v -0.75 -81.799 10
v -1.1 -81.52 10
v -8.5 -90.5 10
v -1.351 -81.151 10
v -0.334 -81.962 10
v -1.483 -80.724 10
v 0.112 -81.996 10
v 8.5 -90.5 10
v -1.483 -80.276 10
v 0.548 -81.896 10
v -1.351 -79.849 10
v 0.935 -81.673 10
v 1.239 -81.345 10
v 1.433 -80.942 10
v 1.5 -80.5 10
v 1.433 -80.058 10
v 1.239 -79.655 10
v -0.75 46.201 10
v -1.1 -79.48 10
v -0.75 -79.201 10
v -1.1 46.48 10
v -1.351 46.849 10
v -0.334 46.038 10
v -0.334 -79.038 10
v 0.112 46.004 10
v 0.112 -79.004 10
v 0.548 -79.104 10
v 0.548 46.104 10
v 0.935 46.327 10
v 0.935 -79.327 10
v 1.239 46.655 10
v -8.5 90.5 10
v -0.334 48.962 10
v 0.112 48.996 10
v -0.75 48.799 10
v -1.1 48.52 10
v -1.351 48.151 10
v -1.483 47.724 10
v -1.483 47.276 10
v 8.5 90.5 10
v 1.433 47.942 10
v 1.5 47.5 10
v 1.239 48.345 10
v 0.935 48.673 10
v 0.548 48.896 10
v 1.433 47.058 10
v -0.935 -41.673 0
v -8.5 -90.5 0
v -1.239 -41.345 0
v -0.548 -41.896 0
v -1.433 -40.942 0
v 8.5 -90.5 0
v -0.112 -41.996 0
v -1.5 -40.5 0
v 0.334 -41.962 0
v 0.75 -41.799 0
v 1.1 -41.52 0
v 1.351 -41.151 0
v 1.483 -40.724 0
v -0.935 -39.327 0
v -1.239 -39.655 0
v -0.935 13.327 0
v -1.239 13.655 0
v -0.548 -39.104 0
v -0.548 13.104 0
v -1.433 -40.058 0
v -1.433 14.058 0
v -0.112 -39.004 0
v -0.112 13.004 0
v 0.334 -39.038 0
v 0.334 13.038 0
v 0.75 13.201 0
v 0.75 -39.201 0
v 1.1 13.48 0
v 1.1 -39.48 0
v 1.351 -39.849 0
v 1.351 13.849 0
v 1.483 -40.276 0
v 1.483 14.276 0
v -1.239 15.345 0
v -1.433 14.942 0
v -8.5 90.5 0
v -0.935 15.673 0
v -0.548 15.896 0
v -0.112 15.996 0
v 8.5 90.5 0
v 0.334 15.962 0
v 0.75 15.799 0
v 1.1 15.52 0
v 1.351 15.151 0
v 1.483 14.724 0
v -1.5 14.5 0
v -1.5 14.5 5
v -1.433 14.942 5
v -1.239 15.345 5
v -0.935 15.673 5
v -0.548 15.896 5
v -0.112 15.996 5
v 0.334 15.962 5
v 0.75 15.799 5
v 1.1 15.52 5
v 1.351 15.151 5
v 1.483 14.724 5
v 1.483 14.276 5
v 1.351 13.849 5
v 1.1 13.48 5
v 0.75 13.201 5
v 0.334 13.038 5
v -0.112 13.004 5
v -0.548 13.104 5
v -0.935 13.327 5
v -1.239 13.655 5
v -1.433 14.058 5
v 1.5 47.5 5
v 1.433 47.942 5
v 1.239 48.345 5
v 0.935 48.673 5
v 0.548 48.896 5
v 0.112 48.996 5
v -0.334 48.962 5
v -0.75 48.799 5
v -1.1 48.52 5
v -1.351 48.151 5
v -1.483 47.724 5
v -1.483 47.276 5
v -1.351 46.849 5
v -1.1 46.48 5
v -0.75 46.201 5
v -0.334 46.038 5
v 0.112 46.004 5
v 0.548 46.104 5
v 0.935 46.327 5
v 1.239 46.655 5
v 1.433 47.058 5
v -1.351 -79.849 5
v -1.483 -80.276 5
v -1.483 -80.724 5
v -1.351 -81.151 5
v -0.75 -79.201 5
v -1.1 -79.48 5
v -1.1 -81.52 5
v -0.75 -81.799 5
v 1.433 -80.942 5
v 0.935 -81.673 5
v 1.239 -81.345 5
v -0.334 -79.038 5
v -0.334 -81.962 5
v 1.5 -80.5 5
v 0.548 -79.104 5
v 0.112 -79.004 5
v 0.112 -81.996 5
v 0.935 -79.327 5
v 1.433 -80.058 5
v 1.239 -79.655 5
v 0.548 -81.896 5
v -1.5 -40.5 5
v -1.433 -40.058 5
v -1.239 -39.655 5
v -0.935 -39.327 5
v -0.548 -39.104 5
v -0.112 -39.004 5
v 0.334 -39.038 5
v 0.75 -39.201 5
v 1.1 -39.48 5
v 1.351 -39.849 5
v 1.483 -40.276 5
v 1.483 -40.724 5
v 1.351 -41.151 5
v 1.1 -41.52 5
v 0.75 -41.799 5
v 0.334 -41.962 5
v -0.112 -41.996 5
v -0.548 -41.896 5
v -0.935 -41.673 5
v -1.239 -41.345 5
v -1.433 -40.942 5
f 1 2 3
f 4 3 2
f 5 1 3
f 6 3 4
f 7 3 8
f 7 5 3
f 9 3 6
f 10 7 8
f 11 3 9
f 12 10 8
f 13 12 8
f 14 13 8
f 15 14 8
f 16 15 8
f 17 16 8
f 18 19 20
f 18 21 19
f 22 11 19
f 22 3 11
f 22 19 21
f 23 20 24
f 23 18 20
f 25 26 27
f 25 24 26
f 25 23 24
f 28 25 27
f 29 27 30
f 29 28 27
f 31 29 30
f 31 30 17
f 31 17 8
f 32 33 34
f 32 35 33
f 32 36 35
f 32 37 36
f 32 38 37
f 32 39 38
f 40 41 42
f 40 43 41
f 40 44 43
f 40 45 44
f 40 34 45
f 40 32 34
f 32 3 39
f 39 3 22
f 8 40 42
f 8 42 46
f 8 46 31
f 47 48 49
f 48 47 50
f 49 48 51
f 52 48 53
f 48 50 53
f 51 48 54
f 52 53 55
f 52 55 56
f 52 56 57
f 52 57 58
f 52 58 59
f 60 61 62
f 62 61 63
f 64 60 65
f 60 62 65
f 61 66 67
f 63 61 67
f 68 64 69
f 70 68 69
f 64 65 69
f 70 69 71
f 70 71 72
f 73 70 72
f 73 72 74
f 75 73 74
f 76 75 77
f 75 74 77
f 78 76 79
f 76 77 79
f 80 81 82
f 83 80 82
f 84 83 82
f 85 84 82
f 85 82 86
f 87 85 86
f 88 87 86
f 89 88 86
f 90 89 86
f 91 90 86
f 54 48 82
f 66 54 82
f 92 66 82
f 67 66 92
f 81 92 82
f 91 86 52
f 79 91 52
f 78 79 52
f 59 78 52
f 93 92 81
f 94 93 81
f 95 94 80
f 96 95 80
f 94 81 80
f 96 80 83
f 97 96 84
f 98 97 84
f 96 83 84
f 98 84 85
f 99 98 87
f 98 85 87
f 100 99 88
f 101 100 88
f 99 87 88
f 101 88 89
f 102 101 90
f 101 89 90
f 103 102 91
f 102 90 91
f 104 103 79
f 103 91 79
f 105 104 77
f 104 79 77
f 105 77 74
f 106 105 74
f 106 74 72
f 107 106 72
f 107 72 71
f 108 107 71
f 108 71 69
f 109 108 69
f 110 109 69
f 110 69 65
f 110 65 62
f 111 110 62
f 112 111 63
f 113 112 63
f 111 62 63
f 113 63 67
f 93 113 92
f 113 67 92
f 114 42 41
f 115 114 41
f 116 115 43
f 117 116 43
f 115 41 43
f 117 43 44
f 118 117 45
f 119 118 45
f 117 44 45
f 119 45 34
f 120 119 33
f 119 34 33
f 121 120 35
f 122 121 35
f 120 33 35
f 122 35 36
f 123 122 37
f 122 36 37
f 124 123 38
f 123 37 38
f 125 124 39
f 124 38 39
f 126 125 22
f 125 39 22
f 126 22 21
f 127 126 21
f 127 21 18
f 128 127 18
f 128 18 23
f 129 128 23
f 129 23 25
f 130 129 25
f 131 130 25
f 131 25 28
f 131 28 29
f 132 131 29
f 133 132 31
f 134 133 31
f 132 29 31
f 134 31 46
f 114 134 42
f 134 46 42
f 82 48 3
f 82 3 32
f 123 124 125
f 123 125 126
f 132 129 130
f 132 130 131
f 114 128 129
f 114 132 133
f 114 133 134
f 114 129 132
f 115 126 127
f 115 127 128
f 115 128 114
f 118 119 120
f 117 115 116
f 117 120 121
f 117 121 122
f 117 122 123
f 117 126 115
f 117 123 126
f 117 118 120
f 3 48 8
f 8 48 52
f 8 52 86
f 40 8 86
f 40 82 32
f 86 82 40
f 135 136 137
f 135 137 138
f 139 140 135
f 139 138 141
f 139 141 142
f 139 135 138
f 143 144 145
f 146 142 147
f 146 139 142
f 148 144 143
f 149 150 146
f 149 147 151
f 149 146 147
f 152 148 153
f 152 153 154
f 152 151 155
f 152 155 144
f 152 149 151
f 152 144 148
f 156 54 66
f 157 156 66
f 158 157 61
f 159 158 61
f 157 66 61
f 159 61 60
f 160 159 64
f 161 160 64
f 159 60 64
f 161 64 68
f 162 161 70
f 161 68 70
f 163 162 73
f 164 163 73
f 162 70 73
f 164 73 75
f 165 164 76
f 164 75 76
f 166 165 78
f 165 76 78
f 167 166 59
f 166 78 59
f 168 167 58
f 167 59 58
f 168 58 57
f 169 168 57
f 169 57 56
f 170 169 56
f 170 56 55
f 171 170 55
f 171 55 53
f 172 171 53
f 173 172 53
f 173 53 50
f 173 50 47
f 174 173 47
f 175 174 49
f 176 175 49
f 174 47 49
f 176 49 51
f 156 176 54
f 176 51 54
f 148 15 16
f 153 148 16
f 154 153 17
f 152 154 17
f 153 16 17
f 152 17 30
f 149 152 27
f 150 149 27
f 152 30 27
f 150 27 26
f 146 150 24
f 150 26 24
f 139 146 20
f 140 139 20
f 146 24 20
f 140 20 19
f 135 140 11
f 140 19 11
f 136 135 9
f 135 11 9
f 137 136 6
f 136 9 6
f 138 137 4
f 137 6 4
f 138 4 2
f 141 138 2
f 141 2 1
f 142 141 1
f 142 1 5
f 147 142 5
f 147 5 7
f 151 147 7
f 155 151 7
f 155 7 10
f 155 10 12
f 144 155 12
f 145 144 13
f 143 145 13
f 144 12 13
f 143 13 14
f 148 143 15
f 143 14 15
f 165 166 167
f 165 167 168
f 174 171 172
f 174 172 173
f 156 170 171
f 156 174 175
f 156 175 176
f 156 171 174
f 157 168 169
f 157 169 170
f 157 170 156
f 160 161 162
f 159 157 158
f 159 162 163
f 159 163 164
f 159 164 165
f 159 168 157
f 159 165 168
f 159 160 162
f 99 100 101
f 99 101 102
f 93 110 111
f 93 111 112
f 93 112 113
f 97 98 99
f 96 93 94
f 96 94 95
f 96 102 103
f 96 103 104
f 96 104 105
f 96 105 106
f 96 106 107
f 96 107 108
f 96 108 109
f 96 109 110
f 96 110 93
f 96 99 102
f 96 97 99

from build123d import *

# Parameters (mm, degrees)
ESQUISSE1_W             = 17
ESQUISSE1_H             = 181
BOSS_EXTRU_1_DEPTH      = 10
ESQUISSE2_R             = 1.5
ENL_V_MAT_EXTRU_1_DEPTH = 5
ESQUISSE4_R             = 1.5
ENL_V_MAT_EXTRU_2_DEPTH = 5


with BuildPart() as part:
    # Esquisse1 → Boss.-Extru.1 (new body)
    with BuildSketch(Plane.XY):
        Rectangle(ESQUISSE1_W, ESQUISSE1_H)
    extrude(amount=BOSS_EXTRU_1_DEPTH)

    # Esquisse2 → Enlèv. mat.-Extru.1 (cut)
    with BuildSketch(Plane.XY.offset(10)):
        with Locations((0, 47.5)):
            Circle(ESQUISSE2_R)
        with Locations((0, -80.5)):
            Circle(ESQUISSE2_R)
    extrude(amount=-ENL_V_MAT_EXTRU_1_DEPTH, mode=Mode.SUBTRACT)

    # Esquisse4 → Enlèv. mat.-Extru.2 (cut)
    with BuildSketch(Plane(origin=(0, 0, 0), x_dir=(-1, 0, 0), z_dir=(0, 0, -1))):
        with Locations((0, 14.5)):
            Circle(ESQUISSE4_R)
        with Locations((0, -40.5)):
            Circle(ESQUISSE4_R)
    extrude(amount=-ENL_V_MAT_EXTRU_2_DEPTH, mode=Mode.SUBTRACT)


solid = part.part
